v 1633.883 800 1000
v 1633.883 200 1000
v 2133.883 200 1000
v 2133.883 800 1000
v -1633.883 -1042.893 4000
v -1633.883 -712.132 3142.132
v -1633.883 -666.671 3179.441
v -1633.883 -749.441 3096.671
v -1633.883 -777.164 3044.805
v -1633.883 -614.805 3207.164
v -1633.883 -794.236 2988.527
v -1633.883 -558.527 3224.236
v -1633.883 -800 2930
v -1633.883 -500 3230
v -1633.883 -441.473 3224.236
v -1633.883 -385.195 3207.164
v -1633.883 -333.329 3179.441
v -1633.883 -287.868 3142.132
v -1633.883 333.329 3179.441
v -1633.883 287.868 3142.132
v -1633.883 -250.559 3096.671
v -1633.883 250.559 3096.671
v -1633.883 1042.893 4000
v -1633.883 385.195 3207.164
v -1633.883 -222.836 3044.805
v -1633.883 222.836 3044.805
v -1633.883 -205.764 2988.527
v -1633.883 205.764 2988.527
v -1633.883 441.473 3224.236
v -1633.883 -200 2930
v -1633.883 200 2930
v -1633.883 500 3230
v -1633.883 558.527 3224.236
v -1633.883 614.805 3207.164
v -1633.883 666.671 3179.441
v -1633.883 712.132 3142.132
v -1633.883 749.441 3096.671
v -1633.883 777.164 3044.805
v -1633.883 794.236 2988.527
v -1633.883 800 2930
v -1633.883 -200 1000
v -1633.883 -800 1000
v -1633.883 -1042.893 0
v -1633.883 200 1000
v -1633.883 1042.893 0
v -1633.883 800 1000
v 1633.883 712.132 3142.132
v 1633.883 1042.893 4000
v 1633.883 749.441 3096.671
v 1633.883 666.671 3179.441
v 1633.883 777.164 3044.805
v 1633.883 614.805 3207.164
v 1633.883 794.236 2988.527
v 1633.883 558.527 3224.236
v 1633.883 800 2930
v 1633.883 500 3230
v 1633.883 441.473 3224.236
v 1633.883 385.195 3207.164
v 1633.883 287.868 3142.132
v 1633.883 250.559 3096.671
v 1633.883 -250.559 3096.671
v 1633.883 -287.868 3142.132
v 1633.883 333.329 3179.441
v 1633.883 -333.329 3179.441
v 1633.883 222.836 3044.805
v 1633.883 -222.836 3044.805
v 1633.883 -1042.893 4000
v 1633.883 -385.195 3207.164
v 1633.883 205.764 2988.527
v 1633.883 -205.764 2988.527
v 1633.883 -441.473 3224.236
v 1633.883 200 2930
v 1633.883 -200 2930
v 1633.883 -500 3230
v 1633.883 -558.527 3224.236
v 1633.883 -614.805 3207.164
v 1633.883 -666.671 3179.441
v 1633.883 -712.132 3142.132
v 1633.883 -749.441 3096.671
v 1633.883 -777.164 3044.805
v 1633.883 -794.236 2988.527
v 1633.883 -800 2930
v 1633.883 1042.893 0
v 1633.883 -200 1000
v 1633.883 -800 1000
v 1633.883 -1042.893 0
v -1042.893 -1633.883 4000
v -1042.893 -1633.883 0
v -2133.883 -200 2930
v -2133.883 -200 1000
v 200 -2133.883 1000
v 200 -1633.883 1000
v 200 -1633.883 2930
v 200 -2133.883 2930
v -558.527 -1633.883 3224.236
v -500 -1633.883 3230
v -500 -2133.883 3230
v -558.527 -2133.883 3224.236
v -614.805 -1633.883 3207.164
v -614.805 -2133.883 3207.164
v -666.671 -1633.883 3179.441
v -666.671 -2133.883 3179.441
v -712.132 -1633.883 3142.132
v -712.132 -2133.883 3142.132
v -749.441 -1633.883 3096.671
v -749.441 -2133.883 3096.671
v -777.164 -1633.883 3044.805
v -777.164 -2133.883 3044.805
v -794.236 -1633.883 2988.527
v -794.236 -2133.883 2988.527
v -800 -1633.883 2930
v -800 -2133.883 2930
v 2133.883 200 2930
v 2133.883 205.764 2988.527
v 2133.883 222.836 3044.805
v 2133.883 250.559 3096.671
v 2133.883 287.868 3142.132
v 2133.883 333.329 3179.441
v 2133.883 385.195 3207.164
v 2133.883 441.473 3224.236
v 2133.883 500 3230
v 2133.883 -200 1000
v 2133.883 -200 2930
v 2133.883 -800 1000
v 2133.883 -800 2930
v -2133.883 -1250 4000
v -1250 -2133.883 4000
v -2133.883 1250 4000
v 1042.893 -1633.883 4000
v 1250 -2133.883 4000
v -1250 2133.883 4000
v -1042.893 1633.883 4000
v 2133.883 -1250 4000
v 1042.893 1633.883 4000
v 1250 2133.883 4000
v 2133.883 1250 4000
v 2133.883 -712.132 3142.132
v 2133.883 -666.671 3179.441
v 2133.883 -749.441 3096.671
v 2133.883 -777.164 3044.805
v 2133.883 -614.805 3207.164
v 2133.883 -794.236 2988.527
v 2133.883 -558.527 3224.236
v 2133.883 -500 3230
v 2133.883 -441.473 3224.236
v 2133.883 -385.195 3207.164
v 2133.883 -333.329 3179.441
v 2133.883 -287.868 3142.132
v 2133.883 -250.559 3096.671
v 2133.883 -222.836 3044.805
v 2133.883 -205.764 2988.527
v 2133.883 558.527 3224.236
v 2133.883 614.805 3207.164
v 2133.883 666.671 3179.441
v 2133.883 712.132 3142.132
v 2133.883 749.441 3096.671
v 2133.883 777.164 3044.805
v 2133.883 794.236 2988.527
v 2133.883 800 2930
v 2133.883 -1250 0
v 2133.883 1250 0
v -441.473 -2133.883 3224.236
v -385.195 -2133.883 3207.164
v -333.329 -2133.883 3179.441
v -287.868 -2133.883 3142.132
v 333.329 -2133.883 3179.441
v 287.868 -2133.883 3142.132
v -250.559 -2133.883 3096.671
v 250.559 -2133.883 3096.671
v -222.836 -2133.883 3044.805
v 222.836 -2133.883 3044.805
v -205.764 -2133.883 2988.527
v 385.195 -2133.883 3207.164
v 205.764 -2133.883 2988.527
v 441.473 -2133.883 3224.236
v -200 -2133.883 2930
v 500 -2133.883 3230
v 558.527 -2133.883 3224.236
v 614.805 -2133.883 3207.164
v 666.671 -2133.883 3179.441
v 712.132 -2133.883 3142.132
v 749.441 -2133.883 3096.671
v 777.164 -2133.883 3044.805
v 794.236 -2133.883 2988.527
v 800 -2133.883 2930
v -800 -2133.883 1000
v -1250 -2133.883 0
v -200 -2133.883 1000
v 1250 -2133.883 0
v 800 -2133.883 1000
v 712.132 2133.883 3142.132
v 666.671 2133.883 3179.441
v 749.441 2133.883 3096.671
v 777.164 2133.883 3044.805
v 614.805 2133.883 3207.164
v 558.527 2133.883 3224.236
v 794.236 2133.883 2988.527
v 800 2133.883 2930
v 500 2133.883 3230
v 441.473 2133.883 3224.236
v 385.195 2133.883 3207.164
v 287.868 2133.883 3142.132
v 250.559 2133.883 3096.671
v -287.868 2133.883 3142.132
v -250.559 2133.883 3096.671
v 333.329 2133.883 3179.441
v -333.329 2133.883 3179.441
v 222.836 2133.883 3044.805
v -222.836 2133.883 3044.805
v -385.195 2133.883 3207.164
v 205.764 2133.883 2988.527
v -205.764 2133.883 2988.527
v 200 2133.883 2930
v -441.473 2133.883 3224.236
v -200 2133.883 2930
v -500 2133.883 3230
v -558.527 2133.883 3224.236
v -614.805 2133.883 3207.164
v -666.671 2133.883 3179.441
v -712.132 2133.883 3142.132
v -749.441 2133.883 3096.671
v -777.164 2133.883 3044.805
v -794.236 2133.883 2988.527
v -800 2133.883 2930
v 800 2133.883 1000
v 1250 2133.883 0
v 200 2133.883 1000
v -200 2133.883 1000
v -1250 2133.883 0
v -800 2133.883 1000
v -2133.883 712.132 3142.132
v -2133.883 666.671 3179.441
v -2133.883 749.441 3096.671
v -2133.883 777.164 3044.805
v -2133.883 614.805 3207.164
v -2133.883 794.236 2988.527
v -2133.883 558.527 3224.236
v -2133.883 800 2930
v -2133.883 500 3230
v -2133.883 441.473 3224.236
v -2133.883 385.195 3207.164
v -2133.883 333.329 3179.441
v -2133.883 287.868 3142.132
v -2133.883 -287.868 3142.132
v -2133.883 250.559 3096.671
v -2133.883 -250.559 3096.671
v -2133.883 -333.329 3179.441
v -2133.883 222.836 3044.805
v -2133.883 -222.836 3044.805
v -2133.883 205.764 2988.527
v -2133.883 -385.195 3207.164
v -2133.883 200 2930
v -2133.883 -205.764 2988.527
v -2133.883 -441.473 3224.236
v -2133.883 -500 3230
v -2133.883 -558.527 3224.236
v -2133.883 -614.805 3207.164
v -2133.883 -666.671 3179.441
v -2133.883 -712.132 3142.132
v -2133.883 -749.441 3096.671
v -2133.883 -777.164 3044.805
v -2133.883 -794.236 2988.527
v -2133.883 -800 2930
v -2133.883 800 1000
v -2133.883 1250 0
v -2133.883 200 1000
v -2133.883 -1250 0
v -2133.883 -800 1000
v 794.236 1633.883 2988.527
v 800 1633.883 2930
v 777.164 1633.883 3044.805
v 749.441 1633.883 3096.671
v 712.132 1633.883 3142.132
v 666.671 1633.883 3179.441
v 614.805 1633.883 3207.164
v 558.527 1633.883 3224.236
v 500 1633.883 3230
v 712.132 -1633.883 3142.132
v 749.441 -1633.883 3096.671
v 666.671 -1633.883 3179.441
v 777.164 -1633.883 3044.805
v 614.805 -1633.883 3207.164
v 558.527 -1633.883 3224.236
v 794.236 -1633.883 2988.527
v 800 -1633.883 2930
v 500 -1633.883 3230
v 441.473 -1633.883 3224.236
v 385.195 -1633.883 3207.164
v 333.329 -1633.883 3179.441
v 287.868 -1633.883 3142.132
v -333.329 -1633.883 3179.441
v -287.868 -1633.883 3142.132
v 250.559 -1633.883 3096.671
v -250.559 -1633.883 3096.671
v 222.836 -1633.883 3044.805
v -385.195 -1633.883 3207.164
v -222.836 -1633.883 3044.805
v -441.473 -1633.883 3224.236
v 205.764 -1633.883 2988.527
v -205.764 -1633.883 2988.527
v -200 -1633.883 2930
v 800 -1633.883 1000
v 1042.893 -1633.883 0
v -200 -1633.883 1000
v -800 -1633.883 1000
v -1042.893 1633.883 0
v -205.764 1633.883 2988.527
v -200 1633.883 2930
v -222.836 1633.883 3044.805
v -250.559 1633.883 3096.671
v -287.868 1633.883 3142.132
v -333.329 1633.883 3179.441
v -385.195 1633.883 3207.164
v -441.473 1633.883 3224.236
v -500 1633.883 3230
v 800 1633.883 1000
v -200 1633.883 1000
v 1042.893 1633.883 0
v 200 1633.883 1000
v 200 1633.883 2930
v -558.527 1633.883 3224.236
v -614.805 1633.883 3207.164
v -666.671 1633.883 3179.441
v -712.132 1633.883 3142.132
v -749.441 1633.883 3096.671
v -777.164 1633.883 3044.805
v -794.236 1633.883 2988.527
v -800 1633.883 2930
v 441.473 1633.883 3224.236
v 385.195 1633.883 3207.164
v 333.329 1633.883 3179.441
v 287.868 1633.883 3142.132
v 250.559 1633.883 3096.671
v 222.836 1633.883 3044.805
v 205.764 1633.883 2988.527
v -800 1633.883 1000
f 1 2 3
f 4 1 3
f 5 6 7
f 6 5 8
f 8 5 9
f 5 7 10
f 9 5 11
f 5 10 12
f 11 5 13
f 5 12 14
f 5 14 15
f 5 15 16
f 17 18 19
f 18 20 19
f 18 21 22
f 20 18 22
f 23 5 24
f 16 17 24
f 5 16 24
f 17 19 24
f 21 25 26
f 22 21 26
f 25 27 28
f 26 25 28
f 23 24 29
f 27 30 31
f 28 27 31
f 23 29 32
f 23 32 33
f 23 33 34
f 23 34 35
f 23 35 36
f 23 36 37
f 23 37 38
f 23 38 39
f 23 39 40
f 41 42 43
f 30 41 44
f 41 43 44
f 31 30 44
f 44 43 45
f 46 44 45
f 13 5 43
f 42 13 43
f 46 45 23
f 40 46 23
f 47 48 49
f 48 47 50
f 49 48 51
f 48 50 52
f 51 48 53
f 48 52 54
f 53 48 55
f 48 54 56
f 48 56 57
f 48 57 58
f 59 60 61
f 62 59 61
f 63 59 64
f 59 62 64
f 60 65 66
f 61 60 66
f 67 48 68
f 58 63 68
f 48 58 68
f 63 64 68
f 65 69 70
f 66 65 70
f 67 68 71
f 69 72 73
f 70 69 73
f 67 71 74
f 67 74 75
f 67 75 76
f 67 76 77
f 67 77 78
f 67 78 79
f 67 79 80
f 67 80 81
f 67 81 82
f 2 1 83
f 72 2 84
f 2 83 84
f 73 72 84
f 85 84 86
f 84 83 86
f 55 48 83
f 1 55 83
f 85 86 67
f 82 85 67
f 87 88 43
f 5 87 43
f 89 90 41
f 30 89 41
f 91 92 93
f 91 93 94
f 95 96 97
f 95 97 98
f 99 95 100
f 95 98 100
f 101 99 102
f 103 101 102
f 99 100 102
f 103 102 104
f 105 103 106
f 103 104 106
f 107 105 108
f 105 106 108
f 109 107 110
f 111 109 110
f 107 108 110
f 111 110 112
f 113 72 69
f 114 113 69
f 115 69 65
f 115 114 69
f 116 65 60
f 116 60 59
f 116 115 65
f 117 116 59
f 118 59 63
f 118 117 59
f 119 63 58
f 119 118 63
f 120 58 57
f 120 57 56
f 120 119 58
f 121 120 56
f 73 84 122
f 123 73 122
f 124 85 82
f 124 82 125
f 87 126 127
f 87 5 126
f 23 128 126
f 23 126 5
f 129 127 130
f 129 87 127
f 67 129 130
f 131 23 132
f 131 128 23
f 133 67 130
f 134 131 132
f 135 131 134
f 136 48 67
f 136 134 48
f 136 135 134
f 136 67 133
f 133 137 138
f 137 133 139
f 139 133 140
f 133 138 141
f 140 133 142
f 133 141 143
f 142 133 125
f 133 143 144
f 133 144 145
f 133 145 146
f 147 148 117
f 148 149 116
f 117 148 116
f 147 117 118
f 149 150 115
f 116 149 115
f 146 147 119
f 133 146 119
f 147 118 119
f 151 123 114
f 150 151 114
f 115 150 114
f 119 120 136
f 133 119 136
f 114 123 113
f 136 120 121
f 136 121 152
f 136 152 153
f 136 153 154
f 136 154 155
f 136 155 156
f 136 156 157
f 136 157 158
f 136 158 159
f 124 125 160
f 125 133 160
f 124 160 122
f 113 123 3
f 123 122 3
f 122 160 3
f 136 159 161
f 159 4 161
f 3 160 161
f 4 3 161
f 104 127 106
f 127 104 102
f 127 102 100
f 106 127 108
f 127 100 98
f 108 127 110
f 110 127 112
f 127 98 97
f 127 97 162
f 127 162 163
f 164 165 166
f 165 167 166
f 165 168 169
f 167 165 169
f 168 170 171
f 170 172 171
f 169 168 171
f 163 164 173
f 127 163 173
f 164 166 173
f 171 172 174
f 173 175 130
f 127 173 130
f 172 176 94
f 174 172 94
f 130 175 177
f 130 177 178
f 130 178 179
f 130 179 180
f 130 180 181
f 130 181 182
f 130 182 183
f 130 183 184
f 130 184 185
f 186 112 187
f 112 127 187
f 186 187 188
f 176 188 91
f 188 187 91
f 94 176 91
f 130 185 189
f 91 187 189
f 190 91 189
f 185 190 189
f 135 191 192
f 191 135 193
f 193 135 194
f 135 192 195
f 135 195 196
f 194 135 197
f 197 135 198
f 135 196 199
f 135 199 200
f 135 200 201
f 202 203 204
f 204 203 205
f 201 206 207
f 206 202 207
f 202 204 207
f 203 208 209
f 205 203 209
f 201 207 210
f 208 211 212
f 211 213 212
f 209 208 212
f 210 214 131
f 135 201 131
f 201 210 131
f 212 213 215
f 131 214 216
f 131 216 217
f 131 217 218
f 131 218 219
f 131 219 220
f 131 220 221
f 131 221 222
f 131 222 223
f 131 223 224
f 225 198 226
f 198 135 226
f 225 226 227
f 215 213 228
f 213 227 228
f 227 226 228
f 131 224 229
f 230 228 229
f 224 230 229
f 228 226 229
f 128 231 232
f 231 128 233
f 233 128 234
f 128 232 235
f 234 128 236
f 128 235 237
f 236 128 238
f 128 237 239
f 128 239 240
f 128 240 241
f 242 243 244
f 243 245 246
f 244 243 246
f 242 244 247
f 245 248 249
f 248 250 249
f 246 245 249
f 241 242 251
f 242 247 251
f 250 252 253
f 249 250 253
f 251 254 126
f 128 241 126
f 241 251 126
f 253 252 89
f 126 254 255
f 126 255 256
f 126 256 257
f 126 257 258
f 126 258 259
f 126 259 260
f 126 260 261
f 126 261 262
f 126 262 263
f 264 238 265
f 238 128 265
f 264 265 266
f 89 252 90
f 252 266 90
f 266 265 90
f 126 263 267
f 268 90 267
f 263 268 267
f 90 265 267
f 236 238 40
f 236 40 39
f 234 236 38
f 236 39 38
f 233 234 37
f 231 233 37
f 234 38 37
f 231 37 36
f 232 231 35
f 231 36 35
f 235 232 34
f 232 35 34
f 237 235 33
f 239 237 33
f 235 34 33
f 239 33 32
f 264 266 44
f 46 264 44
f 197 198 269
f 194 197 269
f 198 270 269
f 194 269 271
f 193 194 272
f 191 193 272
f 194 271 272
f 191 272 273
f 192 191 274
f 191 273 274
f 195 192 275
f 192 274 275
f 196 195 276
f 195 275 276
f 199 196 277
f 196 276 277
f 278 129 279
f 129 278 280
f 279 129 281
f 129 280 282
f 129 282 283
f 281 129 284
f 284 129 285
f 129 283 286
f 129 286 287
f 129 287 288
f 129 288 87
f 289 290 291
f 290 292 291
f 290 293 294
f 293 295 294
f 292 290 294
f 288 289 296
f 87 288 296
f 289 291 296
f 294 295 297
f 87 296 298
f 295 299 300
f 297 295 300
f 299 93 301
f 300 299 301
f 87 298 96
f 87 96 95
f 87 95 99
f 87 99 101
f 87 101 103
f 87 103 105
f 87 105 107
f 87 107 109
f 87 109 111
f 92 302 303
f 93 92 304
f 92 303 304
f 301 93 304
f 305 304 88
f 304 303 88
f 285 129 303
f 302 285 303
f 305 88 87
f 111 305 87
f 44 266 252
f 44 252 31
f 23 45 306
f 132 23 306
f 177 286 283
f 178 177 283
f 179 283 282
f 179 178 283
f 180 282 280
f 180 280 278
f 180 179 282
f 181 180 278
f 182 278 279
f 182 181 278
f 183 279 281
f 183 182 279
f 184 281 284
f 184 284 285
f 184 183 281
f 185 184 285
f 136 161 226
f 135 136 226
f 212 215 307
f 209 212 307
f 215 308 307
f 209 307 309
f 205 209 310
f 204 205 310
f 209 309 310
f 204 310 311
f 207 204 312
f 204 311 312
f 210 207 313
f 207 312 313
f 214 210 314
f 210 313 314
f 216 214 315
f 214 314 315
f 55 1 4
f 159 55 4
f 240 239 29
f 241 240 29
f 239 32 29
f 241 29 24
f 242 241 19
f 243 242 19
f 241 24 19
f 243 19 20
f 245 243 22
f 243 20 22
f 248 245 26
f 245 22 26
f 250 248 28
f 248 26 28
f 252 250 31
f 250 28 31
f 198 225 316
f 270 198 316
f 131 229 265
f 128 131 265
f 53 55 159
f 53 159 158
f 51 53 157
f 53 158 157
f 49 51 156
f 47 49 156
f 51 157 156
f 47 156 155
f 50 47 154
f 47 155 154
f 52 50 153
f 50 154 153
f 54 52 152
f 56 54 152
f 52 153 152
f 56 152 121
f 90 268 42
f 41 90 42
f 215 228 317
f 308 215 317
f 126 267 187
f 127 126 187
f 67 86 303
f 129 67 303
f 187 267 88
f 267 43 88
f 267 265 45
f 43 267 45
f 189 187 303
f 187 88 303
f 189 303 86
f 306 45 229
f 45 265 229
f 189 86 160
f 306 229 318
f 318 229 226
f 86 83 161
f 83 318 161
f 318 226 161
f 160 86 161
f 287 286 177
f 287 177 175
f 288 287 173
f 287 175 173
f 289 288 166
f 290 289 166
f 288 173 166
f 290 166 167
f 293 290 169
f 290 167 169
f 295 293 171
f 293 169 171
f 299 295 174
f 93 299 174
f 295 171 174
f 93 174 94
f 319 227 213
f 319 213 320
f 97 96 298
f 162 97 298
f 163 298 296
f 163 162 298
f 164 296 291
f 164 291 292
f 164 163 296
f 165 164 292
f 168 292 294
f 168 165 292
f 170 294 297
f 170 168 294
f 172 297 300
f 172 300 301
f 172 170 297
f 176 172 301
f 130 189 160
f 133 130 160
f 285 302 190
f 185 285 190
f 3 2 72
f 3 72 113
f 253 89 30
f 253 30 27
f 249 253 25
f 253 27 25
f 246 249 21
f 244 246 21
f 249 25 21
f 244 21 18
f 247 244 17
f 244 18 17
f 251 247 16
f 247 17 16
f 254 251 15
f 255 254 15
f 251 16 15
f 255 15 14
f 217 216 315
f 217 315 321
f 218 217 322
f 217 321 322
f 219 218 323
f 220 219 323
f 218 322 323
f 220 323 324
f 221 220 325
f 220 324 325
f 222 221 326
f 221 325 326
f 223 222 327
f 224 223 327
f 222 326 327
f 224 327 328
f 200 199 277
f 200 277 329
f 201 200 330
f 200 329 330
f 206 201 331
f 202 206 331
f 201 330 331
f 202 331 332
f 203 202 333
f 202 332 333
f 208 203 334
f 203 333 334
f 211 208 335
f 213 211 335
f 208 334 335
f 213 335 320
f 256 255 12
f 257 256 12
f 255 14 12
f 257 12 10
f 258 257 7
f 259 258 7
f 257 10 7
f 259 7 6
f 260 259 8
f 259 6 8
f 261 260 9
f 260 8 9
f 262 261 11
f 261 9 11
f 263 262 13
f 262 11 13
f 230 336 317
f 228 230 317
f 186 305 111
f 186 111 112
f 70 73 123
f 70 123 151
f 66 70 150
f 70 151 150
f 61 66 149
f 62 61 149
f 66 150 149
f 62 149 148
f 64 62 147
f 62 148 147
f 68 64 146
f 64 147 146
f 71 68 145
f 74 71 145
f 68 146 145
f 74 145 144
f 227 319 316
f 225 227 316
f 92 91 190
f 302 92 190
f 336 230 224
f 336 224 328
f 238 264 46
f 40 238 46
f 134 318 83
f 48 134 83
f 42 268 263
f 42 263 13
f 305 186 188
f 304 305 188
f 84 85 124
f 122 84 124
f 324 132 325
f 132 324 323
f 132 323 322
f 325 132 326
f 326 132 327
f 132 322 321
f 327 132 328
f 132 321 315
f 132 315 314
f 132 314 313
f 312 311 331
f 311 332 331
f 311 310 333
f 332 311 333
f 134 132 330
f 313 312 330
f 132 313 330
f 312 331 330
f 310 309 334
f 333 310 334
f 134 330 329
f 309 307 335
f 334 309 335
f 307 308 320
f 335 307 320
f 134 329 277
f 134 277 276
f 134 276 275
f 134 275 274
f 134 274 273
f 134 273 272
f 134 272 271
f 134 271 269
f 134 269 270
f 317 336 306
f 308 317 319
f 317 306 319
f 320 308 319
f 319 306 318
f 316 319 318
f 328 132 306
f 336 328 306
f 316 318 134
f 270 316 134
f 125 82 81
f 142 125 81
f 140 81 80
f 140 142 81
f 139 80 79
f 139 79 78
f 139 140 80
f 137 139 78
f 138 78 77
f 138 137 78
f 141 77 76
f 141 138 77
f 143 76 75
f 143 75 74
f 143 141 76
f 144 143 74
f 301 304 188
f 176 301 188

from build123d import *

# Parameters (mm, degrees)
F1_DEPTH = 4000
F3_W     = 600
F3_H     = 1250
F3_W_2   = 1250
F3_H_2   = 600
F4_DEPTH = 2230
F5_R     = 299.99999


# Not quite as in the source:
# - a fillet or chamfer is up to 0.001 mm smaller than in the source, because OpenCascade refuses the exact size


with BuildPart() as f1:
    # F0 (on Top) → F1 (new body)
    with BuildSketch(Plane.XY):
        Polygon((1250, 2133.8834764832), (-1250, 2133.8834764832), (-2133.8834764832, 1250), (-2133.8834764832, -1250), (-1250, -2133.8834764832), (1250, -2133.8834764832), (2133.8834764832, -1250), (2133.8834764832, 1250), align=None)
        Polygon((1633.8834764832, -1042.8932188135), (1042.8932188135, -1633.8834764832), (-1042.8932188135, -1633.8834764832), (-1633.8834764832, -1042.8932188135), (-1633.8834764832, 1042.8932188135), (-1042.8932188135, 1633.8834764832), (1042.8932188135, 1633.8834764832), (1633.8834764832, 1042.8932188135), align=None, mode=Mode.SUBTRACT)
    extrude(amount=F1_DEPTH)

    # F3 (on offset) → F4 (cut)
    with BuildSketch(Plane(origin=(0, 0, 1000), x_dir=(1, 0, 0), z_dir=(0, 0, -1))):
        with Locations((-500, -1875)):
            Rectangle(F3_W, F3_H)
        with Locations((500, -1875)):
            Rectangle(F3_W, F3_H)
        with Locations((-1875, 500)):
            Rectangle(F3_W_2, F3_H_2)
        with Locations((-1875, -500)):
            Rectangle(F3_W_2, F3_H_2)
        with Locations((500, 1875)):
            Rectangle(F3_W, F3_H)
        with Locations((-500, 1875)):
            Rectangle(F3_W, F3_H)
        with Locations((1875, -500)):
            Rectangle(F3_W_2, F3_H_2)
        with Locations((1875, 500)):
            Rectangle(F3_W_2, F3_H_2)
    extrude(amount=-F4_DEPTH, mode=Mode.SUBTRACT)

    # F5 (radius 300 in the source; OpenCascade refuses exactly that, so slightly less here)
    f5_edges = [f1.edges().sort_by_distance(p)[0] for p in [
        (-1883.883476, -800, 3230),
        (-1883.883476, -200, 3230),
        (-1883.883476, 800, 3230),
        (-1883.883476, 200, 3230),
        (-200, 1883.883476, 3230),
        (800, 1883.883476, 3230),
        (-800, 1883.883476, 3230),
        (200, 1883.883476, 3230),
        (1883.883476, 200, 3230),
        (1883.883476, -800, 3230),
        (1883.883476, 800, 3230),
        (1883.883476, -200, 3230),
        (200, -1883.883476, 3230),
        (-800, -1883.883476, 3230),
        (800, -1883.883476, 3230),
        (-200, -1883.883476, 3230),
    ]]
    fillet(f5_edges, radius=F5_R)


solid = f1.part
